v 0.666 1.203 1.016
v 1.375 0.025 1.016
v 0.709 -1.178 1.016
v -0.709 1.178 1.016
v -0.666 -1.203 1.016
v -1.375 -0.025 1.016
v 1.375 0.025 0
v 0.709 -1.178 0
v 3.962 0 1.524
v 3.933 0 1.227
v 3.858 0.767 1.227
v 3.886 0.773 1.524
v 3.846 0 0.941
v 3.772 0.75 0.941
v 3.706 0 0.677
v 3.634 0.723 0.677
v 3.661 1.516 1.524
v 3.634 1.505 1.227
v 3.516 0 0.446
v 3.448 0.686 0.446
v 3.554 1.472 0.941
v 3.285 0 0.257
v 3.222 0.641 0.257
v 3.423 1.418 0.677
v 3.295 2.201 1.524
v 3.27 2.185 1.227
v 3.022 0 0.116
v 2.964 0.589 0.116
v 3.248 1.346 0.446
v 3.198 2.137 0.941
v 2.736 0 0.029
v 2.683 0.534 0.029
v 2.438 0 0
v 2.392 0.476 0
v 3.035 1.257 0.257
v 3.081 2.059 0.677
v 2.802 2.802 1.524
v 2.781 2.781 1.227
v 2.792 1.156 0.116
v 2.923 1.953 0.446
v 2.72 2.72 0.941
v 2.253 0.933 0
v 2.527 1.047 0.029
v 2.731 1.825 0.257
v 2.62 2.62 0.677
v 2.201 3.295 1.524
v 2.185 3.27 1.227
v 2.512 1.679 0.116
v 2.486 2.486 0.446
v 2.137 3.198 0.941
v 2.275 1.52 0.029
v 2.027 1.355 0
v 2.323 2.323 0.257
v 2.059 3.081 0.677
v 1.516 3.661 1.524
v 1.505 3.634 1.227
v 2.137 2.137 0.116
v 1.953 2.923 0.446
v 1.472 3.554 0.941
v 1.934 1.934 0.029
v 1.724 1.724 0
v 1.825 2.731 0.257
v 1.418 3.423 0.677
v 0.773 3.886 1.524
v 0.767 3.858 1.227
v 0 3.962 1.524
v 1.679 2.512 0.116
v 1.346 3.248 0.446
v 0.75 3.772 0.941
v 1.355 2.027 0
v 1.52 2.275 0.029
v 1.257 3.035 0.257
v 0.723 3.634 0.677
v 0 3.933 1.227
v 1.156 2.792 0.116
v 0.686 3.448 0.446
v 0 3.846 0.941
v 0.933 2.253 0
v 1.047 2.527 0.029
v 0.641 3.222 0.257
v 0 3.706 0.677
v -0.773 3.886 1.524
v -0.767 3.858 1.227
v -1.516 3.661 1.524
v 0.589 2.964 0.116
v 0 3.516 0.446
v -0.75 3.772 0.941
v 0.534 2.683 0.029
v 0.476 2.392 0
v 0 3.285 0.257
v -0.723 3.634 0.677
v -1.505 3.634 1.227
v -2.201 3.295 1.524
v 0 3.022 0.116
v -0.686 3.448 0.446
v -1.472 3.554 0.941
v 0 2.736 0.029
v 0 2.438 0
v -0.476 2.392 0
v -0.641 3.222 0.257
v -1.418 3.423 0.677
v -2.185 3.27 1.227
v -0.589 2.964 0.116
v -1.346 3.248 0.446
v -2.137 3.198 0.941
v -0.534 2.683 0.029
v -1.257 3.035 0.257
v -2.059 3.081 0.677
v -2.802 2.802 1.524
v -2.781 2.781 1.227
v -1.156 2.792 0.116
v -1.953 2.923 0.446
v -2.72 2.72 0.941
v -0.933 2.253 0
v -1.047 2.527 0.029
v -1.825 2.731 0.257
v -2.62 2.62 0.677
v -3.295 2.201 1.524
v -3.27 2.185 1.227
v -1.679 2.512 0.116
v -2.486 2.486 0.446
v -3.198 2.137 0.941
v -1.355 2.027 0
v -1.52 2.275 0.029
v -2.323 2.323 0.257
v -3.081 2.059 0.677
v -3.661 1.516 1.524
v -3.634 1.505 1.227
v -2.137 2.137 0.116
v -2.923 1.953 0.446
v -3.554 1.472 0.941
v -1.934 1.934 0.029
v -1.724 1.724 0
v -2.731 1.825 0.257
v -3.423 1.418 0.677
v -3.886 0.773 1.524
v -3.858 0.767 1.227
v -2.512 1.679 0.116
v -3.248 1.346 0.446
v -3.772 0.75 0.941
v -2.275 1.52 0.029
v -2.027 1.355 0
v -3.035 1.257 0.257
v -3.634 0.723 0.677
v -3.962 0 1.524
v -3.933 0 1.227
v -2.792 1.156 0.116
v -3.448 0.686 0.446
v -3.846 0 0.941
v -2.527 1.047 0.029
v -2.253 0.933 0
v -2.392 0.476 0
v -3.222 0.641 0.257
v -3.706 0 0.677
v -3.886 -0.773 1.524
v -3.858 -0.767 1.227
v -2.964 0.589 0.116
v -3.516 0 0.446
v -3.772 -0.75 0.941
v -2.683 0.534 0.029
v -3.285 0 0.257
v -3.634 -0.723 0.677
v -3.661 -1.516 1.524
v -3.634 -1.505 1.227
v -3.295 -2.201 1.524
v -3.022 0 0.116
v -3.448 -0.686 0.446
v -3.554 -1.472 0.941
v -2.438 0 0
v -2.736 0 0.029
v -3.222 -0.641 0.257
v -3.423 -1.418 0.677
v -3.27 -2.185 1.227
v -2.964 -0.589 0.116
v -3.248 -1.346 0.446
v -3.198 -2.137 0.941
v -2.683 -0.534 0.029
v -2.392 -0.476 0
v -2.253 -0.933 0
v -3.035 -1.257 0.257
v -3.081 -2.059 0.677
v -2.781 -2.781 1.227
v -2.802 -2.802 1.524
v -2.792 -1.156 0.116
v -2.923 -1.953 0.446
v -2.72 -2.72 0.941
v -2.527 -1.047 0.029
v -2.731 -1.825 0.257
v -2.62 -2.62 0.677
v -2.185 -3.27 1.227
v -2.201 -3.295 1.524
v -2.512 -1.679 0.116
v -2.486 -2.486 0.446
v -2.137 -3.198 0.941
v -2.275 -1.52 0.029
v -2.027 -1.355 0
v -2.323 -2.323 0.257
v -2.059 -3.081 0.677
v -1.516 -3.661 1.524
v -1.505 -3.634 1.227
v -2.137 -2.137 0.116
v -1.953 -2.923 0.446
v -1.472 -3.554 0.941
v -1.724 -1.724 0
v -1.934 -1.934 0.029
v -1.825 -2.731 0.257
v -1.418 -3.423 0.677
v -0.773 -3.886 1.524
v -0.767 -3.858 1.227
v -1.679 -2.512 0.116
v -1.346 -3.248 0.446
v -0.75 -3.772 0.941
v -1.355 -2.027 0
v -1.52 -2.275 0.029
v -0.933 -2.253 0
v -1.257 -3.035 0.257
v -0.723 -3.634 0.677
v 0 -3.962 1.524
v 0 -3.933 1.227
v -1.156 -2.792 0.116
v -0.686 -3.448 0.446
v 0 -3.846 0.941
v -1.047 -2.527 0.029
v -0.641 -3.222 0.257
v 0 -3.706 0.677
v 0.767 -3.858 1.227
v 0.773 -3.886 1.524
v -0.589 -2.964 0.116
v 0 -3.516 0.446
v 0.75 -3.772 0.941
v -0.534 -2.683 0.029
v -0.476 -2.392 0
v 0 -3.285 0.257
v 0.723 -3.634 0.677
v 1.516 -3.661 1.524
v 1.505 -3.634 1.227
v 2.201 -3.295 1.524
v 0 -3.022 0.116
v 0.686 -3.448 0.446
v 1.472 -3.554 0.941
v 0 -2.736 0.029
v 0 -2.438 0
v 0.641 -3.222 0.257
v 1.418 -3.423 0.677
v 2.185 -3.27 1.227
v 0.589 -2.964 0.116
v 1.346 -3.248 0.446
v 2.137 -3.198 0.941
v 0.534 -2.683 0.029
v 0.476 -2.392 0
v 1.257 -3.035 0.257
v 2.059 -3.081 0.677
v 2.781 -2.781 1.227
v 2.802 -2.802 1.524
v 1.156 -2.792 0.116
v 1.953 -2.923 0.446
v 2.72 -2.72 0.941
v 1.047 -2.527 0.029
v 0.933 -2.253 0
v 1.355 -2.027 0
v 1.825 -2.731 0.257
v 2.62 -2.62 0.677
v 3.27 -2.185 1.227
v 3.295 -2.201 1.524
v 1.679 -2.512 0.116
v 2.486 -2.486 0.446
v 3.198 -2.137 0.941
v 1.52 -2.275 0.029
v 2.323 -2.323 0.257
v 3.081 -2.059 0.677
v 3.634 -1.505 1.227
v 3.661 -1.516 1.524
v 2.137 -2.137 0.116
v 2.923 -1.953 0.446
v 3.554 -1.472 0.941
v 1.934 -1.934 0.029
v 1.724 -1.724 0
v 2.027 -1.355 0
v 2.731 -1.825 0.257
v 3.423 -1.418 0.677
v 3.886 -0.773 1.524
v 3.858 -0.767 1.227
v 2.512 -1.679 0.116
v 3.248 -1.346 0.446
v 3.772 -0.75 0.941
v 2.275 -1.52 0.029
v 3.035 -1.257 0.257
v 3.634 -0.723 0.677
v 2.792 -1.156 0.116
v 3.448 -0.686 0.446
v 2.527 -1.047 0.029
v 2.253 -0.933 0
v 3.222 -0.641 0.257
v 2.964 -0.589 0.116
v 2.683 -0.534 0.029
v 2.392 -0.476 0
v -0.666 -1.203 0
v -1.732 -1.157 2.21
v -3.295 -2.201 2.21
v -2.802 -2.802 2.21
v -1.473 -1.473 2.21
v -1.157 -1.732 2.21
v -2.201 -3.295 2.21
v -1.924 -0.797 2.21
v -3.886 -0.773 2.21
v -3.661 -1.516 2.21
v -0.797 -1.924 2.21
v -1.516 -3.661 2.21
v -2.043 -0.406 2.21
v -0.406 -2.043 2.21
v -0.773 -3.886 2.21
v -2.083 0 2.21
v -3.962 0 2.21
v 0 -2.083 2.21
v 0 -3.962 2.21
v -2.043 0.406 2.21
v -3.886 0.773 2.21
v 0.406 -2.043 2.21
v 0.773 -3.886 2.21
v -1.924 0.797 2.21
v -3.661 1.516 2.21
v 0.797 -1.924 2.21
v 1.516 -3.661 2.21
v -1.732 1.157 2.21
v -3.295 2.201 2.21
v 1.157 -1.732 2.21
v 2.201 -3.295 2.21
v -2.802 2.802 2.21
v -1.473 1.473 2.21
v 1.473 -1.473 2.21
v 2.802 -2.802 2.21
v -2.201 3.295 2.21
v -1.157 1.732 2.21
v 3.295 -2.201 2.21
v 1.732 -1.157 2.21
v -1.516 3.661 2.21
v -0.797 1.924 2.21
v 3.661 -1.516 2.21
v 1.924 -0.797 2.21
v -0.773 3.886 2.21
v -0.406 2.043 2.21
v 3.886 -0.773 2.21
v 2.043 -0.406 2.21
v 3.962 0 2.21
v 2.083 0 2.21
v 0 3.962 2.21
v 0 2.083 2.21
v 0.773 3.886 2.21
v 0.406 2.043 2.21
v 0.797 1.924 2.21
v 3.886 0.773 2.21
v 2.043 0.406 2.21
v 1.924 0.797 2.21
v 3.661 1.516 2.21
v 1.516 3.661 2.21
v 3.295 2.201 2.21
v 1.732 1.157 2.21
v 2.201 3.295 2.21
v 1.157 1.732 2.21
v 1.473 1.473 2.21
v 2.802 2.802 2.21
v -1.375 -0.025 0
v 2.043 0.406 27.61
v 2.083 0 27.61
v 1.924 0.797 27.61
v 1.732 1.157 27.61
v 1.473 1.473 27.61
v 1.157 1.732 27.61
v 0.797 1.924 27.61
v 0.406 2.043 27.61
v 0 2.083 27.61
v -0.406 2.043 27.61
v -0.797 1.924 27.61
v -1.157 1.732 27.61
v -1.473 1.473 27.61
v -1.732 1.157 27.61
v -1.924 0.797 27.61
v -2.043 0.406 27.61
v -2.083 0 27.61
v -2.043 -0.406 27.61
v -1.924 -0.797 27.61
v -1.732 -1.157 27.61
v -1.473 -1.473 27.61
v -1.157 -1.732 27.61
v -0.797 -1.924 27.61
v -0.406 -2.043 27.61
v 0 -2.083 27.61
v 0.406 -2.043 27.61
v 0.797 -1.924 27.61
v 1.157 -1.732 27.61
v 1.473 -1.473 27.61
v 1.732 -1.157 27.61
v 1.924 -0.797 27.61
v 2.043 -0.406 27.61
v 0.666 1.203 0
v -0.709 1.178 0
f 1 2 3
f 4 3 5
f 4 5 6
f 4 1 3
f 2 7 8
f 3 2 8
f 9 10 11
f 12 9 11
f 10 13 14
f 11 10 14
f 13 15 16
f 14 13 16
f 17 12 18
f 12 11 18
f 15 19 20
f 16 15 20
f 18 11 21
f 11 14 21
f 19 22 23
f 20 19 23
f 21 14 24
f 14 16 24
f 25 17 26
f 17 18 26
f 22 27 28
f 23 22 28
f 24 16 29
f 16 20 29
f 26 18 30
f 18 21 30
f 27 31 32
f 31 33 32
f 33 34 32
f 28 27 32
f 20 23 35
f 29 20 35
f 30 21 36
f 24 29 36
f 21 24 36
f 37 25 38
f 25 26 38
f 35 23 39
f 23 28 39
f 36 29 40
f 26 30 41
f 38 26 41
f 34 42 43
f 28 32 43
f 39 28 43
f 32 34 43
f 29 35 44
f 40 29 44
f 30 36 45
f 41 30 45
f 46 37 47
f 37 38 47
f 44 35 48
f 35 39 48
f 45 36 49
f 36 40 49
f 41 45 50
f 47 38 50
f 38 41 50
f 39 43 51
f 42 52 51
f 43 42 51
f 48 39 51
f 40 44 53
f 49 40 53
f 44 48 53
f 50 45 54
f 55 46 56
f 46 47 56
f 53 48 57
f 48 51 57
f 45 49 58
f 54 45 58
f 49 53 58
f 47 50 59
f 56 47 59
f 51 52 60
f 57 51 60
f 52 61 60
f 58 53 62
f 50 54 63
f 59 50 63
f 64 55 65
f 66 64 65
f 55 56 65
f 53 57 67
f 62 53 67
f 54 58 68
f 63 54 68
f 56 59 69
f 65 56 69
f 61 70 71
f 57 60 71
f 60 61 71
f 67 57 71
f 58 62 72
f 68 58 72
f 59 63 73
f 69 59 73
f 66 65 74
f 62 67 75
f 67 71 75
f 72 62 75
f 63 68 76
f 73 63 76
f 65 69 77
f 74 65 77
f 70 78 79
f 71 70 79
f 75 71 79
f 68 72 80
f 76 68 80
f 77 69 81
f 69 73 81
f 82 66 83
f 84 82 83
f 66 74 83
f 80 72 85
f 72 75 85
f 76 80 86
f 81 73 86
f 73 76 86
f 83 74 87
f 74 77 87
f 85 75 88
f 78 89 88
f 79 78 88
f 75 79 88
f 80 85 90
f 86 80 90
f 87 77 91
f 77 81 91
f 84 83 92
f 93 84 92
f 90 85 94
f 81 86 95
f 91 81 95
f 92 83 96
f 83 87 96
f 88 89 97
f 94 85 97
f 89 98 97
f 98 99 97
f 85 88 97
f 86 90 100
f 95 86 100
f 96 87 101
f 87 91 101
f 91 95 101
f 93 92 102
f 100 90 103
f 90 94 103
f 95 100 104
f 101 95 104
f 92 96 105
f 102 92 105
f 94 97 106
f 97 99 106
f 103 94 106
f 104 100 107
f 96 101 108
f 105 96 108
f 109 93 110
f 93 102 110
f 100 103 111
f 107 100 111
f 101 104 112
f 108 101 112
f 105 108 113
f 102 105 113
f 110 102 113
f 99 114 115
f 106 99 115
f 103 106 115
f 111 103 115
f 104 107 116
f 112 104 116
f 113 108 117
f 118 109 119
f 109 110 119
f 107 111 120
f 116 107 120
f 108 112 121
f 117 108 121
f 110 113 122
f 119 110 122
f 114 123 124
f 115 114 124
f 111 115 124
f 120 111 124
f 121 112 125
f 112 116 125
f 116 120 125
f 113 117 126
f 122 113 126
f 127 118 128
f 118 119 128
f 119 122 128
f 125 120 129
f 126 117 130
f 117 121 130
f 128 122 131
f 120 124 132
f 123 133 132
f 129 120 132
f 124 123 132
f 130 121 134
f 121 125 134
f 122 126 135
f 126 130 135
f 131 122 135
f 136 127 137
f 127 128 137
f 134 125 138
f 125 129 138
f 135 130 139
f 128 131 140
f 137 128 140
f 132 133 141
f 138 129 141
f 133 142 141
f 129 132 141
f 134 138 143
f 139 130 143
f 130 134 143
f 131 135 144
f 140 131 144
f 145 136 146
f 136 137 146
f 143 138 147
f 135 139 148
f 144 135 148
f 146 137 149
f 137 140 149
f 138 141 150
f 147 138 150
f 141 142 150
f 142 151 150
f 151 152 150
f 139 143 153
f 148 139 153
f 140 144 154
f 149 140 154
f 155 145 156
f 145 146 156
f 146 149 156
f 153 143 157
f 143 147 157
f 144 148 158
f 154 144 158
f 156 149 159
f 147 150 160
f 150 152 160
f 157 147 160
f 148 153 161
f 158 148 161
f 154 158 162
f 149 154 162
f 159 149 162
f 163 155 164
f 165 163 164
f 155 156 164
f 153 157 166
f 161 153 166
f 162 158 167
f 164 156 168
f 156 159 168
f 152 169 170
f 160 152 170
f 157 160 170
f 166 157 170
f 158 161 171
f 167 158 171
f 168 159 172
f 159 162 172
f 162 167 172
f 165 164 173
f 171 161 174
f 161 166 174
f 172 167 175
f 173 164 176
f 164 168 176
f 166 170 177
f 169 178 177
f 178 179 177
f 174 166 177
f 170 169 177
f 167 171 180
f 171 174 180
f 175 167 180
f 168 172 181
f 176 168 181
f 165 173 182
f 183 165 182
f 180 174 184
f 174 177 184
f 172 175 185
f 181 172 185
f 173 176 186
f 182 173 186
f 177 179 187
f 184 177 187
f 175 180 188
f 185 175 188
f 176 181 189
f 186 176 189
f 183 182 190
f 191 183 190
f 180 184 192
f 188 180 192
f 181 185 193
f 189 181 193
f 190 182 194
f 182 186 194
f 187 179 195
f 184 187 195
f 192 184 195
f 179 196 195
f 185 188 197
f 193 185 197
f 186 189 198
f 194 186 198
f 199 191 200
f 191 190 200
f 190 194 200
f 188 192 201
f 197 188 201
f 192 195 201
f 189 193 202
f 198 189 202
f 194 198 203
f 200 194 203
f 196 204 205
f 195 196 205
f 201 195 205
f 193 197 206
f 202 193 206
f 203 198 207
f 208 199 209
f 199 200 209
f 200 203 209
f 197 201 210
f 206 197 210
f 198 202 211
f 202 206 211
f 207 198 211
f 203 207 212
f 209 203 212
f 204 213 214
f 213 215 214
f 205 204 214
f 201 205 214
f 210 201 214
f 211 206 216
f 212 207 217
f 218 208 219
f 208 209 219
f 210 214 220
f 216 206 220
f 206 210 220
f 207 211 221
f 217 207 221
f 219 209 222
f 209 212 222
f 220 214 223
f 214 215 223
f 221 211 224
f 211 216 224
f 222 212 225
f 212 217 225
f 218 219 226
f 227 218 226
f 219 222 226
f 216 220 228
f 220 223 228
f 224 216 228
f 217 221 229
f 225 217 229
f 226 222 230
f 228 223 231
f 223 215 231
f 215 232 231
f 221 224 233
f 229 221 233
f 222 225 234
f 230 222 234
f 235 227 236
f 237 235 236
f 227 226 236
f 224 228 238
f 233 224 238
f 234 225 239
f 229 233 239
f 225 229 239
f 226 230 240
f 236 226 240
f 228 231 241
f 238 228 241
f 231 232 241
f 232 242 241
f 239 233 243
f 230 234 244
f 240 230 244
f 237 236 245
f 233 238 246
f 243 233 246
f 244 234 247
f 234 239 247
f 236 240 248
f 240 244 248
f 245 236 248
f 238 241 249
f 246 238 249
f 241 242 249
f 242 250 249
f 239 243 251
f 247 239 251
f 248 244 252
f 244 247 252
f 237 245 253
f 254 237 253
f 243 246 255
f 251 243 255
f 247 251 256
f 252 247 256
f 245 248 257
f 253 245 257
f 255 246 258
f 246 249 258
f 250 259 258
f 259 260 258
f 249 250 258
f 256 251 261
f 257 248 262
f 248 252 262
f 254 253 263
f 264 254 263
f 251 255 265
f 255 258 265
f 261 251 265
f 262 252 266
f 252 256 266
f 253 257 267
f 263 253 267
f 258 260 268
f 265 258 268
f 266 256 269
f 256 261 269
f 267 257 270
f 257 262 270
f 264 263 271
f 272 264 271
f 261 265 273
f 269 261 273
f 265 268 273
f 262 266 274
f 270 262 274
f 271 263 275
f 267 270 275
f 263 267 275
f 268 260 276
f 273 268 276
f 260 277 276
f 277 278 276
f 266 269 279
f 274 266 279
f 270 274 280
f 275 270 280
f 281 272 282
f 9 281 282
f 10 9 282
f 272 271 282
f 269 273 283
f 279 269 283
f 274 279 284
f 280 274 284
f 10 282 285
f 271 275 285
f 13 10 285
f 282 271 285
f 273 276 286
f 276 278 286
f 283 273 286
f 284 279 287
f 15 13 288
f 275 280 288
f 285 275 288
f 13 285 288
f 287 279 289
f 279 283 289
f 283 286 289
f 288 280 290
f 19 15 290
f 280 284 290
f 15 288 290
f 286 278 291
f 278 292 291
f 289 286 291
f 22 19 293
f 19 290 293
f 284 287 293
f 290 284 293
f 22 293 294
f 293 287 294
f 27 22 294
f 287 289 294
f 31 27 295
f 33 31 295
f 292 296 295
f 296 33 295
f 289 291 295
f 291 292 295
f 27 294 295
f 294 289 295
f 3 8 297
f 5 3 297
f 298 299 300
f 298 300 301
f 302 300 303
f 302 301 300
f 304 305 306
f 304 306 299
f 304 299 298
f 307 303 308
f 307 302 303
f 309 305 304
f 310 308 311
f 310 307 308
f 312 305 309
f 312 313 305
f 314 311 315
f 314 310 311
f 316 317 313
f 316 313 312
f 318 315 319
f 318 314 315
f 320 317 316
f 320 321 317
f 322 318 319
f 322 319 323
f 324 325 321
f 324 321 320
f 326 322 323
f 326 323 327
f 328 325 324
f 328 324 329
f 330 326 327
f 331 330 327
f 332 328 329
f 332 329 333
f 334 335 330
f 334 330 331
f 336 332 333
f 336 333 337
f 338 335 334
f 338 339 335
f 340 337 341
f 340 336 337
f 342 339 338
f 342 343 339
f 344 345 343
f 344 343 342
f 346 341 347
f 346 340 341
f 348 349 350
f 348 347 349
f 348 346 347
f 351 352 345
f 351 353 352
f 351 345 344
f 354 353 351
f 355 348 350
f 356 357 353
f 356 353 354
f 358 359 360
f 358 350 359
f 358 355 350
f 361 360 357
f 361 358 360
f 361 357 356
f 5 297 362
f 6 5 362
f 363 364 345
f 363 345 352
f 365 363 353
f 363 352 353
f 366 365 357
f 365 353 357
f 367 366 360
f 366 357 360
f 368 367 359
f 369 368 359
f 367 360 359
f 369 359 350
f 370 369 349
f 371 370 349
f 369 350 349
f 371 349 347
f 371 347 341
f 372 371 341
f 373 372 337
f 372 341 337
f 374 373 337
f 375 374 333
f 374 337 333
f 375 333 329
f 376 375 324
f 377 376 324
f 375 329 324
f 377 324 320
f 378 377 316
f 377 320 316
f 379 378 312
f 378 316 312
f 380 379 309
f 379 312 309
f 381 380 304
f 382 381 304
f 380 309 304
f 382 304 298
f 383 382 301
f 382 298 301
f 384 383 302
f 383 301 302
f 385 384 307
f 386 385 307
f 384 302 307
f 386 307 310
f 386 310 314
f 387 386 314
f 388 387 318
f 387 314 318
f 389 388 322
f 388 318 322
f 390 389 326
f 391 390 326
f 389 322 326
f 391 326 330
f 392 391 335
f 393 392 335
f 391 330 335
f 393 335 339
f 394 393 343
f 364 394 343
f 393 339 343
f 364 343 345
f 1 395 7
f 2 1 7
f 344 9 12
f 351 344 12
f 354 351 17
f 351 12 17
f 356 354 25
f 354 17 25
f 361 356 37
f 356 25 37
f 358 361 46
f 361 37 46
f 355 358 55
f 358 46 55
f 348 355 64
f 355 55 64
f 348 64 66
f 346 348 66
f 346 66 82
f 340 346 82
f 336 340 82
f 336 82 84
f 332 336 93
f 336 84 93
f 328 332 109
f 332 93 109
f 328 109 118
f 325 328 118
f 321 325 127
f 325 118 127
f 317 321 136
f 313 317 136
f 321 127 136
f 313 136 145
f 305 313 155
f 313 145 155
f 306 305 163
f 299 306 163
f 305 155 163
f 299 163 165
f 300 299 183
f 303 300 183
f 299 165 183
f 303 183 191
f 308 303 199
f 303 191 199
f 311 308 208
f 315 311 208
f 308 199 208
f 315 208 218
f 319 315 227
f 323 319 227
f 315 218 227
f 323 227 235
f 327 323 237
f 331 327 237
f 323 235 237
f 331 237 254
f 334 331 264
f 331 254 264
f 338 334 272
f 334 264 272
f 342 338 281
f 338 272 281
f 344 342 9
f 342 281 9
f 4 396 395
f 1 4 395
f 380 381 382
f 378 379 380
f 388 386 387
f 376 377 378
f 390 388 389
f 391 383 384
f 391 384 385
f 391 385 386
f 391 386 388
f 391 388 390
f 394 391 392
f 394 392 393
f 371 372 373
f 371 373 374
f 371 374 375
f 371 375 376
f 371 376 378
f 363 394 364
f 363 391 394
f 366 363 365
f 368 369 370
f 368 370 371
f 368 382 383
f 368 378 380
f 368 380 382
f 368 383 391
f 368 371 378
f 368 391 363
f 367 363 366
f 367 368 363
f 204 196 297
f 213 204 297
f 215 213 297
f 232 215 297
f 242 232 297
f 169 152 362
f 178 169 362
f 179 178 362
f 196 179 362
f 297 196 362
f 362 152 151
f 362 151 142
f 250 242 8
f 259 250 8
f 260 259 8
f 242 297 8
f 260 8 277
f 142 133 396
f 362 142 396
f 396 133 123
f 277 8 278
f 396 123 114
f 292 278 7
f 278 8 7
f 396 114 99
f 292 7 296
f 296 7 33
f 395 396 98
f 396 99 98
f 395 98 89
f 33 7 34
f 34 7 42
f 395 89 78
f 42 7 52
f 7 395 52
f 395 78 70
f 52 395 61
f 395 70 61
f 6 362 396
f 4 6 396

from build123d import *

# Parameters (mm, degrees)
SKETCH1_R      = 3.9624
EXTRUDE1_DEPTH = 2.2098
FILLET1_R      = 1.524
SKETCH2_R      = 2.0828
EXTRUDE2_DEPTH = 25.4
EXTRUDE3_DEPTH = 1.016


with BuildPart() as part:
    # Sketch1 → Extrude1 (new body)
    with BuildSketch(Plane.XY):
        Circle(SKETCH1_R)
    extrude(amount=EXTRUDE1_DEPTH)

    # Fillet1
    fillet1_edges = [part.edges().sort_by_distance(p)[0] for p in [
        (-3.9624, 0, 0),
    ]]
    fillet(fillet1_edges, radius=FILLET1_R)

    # Sketch2 → Extrude2 (add)
    with BuildSketch(Plane.XY.offset(2.2098)):
        Circle(SKETCH2_R)
    extrude(amount=EXTRUDE2_DEPTH)

    # Sketch3 → Extrude3 (cut)
    with BuildSketch(Plane(origin=(0, 0, 0), x_dir=(-1, 0, 0), z_dir=(0, 0, -1))):
        Polygon((0.709024608, 1.177879999), (-0.665561698, 1.202973322), (-1.374586306, 0.025093323), (-0.709024608, -1.177879999), (0.665561698, -1.202973322), (1.374586306, -0.025093323), align=None)
    extrude(amount=-EXTRUDE3_DEPTH, mode=Mode.SUBTRACT)


solid = part.part
